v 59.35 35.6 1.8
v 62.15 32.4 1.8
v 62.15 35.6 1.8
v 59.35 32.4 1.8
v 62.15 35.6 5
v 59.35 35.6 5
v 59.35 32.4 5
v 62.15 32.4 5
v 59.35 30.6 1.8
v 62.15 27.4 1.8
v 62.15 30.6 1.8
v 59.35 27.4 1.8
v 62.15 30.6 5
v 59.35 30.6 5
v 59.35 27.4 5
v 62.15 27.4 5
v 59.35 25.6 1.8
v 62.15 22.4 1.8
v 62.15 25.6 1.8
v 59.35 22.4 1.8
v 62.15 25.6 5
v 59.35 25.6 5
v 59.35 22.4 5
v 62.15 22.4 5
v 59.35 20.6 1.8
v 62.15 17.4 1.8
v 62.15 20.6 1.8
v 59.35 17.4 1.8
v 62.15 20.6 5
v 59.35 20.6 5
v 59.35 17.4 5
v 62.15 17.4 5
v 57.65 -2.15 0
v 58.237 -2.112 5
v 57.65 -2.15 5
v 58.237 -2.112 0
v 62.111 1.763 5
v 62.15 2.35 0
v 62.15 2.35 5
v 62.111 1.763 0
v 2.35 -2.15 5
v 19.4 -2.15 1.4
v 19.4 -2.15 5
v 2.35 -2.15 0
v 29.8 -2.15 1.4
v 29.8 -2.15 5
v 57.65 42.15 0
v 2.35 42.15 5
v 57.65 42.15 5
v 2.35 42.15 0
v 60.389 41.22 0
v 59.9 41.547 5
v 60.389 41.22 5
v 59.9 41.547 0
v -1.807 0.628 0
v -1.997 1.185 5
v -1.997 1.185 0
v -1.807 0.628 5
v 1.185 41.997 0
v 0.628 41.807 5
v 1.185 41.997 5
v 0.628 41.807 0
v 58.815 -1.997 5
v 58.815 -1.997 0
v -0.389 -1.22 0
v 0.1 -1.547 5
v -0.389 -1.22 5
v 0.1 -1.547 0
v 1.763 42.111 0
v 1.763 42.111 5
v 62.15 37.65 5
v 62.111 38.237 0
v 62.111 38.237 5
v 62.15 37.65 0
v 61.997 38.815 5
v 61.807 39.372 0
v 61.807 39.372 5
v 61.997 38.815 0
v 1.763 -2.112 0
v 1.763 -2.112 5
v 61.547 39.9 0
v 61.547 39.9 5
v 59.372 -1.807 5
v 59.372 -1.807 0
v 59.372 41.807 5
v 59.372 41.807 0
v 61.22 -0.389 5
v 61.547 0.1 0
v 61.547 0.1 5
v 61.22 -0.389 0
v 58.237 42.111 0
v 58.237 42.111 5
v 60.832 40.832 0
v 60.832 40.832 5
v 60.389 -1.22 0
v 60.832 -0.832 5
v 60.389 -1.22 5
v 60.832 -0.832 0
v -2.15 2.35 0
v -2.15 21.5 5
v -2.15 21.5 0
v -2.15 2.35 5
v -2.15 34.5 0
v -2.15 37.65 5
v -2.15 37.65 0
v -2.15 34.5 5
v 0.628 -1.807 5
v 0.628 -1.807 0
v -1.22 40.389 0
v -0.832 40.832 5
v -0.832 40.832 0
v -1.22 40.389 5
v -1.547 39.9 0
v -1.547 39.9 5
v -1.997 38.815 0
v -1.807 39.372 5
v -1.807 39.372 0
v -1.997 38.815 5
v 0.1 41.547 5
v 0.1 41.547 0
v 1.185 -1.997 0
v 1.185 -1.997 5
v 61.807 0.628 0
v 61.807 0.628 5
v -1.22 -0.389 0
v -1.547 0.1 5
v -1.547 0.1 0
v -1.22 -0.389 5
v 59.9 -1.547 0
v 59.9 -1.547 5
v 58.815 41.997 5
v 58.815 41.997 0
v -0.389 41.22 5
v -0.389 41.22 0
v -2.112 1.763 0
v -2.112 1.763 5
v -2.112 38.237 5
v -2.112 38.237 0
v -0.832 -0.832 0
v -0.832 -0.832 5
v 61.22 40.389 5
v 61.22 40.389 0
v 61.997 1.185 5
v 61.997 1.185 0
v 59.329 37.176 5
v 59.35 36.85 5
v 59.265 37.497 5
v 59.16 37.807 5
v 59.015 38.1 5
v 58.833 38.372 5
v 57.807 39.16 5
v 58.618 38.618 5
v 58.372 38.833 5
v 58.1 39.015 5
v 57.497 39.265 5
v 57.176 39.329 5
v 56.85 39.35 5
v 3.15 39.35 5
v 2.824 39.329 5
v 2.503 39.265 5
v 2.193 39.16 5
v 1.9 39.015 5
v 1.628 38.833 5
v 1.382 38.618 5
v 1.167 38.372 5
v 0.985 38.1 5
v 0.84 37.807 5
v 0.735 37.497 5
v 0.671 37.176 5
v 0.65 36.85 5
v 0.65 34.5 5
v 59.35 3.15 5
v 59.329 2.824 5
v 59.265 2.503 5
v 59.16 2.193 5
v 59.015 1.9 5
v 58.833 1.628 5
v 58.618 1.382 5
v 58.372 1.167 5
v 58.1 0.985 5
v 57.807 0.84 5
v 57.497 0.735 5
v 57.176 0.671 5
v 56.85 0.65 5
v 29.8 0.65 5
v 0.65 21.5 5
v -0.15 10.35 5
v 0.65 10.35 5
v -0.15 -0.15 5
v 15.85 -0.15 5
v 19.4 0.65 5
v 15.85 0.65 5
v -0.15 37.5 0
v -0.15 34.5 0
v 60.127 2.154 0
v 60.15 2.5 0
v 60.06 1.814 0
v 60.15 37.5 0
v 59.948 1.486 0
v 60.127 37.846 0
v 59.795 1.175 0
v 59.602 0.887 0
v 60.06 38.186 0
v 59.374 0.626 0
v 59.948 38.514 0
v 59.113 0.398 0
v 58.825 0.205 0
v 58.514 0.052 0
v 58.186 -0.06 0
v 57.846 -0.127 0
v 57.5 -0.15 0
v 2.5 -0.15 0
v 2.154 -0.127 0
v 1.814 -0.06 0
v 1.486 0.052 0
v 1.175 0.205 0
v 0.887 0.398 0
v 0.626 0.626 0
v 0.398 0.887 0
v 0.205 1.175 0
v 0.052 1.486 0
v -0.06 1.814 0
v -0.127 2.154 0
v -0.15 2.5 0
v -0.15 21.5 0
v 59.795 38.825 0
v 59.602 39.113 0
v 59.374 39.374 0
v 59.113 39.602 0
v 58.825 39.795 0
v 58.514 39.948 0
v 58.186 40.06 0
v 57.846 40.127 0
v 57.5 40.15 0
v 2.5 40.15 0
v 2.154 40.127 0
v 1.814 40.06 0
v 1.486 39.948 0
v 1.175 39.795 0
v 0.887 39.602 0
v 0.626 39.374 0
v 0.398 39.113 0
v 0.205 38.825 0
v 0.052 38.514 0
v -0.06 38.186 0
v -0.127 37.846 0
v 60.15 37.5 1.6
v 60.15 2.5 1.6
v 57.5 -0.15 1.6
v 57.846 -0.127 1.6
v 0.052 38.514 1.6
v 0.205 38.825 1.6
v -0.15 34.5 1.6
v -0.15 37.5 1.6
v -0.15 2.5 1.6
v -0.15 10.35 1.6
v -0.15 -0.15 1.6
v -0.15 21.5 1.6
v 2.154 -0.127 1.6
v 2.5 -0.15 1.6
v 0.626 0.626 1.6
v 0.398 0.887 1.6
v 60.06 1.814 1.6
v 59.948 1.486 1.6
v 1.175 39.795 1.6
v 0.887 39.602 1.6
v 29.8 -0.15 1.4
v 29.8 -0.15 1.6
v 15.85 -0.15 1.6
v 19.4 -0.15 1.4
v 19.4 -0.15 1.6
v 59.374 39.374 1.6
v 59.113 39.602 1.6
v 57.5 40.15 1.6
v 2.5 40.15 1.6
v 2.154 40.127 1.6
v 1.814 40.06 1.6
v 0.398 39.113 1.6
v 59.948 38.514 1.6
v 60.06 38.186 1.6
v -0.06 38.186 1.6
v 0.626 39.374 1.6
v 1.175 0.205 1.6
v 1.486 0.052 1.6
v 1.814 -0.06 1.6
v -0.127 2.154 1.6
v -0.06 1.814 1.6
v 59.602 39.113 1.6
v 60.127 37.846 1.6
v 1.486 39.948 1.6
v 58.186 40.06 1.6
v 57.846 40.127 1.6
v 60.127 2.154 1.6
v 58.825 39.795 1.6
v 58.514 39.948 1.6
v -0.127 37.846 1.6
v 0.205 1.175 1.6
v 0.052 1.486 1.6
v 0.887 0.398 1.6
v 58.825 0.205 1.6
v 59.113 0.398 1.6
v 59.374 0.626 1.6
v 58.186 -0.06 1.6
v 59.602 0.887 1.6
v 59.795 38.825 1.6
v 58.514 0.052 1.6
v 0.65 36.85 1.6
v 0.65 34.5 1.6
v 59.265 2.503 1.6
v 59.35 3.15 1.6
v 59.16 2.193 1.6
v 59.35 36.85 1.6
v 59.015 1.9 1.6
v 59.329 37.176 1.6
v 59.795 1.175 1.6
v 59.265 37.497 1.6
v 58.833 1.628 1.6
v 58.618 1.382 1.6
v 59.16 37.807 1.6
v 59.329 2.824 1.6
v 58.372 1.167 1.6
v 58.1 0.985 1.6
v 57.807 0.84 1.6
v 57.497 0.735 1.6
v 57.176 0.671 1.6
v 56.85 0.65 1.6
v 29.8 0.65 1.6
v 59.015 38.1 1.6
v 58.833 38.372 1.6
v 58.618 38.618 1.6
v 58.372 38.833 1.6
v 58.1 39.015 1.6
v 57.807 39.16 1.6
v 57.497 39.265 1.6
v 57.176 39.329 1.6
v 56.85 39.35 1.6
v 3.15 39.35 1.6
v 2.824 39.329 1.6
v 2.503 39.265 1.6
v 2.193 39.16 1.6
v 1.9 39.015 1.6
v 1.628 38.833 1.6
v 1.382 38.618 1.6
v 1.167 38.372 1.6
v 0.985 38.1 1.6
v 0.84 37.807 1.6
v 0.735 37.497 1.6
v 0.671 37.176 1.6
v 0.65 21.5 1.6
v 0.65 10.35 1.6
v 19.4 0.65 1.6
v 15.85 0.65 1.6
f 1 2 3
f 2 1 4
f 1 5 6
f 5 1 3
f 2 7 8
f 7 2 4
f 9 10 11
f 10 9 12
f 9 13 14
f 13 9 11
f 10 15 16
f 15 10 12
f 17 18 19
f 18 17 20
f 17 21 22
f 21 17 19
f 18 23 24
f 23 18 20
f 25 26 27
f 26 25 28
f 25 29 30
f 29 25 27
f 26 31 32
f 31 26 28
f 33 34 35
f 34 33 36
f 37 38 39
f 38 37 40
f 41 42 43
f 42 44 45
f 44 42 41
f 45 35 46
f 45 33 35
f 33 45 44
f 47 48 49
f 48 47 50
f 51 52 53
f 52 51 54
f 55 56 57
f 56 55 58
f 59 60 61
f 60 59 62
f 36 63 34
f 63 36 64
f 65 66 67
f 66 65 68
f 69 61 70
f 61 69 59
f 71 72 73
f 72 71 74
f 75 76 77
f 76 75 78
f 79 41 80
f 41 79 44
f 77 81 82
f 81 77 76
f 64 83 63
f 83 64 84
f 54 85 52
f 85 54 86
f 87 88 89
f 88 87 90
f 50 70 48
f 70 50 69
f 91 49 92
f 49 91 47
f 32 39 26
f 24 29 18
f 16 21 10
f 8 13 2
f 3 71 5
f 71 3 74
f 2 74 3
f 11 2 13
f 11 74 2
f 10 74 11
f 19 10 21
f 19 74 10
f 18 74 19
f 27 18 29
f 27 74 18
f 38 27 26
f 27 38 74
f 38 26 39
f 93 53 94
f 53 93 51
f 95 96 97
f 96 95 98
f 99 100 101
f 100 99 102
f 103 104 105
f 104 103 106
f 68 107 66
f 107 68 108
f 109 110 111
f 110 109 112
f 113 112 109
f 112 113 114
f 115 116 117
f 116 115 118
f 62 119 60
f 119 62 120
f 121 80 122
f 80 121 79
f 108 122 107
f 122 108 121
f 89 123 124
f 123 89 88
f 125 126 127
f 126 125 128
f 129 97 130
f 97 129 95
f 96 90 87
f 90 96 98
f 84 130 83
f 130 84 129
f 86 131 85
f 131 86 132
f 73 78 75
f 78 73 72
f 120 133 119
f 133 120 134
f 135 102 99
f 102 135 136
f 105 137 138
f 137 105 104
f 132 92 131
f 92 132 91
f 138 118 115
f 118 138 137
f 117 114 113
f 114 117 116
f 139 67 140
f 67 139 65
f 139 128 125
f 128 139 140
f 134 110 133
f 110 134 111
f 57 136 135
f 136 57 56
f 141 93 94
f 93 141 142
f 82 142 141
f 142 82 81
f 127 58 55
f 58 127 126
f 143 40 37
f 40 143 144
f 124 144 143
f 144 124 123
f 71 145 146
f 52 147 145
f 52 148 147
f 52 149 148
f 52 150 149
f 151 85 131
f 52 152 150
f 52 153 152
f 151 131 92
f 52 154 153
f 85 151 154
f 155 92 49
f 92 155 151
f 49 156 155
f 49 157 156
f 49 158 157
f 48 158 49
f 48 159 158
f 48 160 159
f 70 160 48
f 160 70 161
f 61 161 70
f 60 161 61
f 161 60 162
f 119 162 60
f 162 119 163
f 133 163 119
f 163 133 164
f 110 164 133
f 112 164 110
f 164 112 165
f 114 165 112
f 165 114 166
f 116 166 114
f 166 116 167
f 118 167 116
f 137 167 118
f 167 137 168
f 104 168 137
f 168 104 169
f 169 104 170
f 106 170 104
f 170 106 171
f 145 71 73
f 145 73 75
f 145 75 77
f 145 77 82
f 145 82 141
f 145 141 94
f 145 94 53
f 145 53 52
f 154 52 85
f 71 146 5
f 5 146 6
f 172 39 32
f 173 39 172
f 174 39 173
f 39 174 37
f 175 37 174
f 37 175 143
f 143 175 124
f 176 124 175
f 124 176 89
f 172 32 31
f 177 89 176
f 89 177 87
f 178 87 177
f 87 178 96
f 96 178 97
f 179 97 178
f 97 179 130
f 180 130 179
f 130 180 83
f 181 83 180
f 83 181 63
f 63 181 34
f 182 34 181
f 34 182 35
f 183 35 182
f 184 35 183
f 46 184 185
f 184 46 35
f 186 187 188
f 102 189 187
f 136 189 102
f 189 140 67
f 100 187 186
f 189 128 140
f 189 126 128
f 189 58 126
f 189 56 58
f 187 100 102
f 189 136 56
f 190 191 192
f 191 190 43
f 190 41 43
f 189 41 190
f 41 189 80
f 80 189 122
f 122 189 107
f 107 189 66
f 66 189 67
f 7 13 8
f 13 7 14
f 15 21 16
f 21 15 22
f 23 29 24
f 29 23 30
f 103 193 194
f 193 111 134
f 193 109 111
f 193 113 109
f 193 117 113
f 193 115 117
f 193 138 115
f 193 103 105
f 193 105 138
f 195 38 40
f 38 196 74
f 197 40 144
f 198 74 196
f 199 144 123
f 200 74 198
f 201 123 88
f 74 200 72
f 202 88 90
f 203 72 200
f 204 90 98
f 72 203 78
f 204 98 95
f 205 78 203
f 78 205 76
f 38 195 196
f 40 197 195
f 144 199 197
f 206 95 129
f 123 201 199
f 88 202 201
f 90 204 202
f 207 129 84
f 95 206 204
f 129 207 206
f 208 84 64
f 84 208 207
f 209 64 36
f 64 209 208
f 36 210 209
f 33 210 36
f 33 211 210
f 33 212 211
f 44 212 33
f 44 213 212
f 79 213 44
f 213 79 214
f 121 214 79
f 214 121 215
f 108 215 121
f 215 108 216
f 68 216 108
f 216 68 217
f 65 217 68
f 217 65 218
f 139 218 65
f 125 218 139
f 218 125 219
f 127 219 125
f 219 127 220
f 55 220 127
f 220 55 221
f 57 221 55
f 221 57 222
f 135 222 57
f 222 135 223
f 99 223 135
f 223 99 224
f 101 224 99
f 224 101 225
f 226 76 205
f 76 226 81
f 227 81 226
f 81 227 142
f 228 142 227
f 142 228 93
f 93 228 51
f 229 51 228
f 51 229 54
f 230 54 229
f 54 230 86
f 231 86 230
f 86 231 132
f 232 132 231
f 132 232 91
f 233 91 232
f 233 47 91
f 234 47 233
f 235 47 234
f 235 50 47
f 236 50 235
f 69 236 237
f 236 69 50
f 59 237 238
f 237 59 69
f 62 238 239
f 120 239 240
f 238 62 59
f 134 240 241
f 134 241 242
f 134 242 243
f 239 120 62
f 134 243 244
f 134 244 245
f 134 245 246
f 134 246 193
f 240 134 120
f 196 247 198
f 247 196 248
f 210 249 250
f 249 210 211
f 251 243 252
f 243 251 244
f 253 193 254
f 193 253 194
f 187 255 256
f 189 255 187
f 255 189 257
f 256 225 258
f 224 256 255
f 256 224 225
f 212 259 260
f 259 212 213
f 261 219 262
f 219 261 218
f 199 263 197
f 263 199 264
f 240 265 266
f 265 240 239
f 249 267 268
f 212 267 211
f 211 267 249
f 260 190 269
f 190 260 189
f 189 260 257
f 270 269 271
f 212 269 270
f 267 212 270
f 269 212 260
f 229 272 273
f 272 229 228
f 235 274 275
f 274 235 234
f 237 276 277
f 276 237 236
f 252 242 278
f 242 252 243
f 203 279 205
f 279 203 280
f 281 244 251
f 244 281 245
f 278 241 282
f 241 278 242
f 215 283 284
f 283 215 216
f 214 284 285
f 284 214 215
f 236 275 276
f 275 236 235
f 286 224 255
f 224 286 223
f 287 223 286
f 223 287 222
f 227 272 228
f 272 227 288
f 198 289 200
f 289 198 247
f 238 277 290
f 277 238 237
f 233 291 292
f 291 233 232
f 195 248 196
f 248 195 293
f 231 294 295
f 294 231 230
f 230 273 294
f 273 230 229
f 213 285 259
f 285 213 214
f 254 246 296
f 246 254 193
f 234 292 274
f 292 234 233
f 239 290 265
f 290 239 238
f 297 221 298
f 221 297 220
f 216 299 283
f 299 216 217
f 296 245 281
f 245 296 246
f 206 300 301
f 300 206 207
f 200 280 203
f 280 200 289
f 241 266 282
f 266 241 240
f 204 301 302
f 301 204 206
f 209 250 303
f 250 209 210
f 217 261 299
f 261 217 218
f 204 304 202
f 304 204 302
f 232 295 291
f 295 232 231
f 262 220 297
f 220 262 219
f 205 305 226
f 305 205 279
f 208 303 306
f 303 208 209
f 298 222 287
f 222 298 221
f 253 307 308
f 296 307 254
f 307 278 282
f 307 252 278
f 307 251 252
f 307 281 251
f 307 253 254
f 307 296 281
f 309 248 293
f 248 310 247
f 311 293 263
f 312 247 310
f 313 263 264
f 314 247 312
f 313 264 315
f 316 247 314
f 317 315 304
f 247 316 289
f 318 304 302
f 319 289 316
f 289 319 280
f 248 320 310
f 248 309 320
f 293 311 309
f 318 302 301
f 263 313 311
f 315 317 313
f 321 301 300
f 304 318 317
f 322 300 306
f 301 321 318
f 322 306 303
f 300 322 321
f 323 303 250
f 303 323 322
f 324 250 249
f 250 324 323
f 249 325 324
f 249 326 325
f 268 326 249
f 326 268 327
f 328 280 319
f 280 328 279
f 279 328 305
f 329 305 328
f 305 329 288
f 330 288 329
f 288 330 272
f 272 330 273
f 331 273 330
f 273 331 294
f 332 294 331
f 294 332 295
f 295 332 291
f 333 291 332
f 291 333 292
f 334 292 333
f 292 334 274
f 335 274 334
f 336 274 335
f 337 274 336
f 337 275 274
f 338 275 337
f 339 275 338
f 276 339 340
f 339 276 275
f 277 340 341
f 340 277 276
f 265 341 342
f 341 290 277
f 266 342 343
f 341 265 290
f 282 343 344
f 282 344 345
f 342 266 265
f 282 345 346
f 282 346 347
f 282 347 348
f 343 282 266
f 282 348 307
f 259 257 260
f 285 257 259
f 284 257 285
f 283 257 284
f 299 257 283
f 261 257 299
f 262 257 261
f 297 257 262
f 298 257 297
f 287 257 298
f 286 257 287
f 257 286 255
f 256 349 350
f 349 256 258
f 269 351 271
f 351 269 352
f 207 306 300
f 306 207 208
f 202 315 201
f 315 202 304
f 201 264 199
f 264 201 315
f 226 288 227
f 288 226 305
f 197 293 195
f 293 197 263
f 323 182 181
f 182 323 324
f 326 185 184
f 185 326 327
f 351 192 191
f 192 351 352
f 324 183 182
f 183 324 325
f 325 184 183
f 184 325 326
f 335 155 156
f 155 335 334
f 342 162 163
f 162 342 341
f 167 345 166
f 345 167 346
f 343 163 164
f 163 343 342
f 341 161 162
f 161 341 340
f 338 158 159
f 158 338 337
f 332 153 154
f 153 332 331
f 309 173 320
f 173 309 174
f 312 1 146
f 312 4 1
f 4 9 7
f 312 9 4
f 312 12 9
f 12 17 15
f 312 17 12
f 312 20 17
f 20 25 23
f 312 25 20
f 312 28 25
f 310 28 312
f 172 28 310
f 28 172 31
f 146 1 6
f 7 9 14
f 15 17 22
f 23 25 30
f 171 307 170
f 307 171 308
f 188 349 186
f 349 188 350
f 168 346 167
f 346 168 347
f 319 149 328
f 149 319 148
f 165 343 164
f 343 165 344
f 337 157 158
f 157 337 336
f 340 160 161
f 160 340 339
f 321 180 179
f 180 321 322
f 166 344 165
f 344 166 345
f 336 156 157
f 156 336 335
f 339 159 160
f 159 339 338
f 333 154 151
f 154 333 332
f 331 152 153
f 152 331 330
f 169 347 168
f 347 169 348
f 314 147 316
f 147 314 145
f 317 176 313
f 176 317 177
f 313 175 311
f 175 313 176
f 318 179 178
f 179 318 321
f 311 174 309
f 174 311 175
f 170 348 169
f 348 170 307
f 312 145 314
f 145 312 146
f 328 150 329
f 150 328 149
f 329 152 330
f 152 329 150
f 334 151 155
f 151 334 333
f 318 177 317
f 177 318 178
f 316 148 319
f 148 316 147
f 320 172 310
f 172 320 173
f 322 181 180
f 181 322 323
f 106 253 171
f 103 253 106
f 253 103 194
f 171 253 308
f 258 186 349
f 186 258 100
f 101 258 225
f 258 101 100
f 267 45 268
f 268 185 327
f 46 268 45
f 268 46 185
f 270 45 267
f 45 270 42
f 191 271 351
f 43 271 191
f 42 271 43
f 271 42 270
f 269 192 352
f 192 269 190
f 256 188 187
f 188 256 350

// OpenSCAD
// Canary v1 bumper: a 3D-printable frame that protects the board's edges.
// Open top (sounder, LEDs, button, sensors) and open bottom: the board's
// underside sits flush with the frame's, so the thermal tab still lies on
// the pack. The board presses in from below and a 0.8 mm lip stops it at
// the top face. Openings for USB-C (left), the probe connector (bottom
// edge) and air vents beside the sensor head (right).
// Board coordinates: KiCad x-100, y-100 (y flipped to OpenSCAD's +y up).
$fn = 48;
BW = 60; BH = 40; BR = 2.5; BT = 1.6;   // board
CLR = 0.15;                           // fit clearance per side
WALL = 2.0; LIP = 0.8; LIPT = 0.8;    // wall, lip overhang, lip thickness
H = BT + LIPT + 2.6;                  // total height (lip tops out 2.6 mm above it)

module rrect(w, h, r, z) { translate([0, 0, 0]) linear_extrude(z) offset(r) offset(-r) square([w, h]); }
function ky(y) = BH - (y - 100);      // KiCad y -> OpenSCAD y
function kx(x) = x - 100;

difference() {
  translate([-WALL - CLR, -WALL - CLR, 0]) rrect(BW + 2 * (WALL + CLR), BH + 2 * (WALL + CLR), BR + WALL, H);
  // board pocket, through
  translate([-CLR, -CLR, -1]) rrect(BW + 2 * CLR, BH + 2 * CLR, BR + CLR, BT + 1);
  // above the board: open, less the lip
  translate([LIP - CLR, LIP - CLR, BT]) rrect(BW - 2 * LIP + 2 * CLR, BH - 2 * LIP + 2 * CLR, BR, H);
  // USB-C opening, left edge, centred on the connector (KiCad y 112), plug overmould 12 x 7
  translate([-WALL - 1, ky(112) - 6.5, -1]) cube([WALL + LIP + 2, 13, H + 2]);   // plug overmould hangs below board level
  // probe connector J3 at the bottom edge (KiCad x 124.6), 10 mm wide, above board level
  // (the wall below it keeps the frame in one piece)
  translate([kx(124.6) - 5.2, -WALL - 1, BT - 0.2]) cube([10.4, WALL + LIP + 2, H]);
  // air vents beside the sensor head (right edge, KiCad y 104..124)
  for (y = [106, 111, 116, 121]) translate([BW - 1, ky(y) - 1.6, BT + 0.2]) cube([WALL + 3, 3.2, H]);
  // thermal tab corner: no lip, so the tab can flex onto the pack
  translate([-CLR, -CLR, BT]) cube([16, 10.5, H]);   // lip only; the wall stays and joins the frame
}
